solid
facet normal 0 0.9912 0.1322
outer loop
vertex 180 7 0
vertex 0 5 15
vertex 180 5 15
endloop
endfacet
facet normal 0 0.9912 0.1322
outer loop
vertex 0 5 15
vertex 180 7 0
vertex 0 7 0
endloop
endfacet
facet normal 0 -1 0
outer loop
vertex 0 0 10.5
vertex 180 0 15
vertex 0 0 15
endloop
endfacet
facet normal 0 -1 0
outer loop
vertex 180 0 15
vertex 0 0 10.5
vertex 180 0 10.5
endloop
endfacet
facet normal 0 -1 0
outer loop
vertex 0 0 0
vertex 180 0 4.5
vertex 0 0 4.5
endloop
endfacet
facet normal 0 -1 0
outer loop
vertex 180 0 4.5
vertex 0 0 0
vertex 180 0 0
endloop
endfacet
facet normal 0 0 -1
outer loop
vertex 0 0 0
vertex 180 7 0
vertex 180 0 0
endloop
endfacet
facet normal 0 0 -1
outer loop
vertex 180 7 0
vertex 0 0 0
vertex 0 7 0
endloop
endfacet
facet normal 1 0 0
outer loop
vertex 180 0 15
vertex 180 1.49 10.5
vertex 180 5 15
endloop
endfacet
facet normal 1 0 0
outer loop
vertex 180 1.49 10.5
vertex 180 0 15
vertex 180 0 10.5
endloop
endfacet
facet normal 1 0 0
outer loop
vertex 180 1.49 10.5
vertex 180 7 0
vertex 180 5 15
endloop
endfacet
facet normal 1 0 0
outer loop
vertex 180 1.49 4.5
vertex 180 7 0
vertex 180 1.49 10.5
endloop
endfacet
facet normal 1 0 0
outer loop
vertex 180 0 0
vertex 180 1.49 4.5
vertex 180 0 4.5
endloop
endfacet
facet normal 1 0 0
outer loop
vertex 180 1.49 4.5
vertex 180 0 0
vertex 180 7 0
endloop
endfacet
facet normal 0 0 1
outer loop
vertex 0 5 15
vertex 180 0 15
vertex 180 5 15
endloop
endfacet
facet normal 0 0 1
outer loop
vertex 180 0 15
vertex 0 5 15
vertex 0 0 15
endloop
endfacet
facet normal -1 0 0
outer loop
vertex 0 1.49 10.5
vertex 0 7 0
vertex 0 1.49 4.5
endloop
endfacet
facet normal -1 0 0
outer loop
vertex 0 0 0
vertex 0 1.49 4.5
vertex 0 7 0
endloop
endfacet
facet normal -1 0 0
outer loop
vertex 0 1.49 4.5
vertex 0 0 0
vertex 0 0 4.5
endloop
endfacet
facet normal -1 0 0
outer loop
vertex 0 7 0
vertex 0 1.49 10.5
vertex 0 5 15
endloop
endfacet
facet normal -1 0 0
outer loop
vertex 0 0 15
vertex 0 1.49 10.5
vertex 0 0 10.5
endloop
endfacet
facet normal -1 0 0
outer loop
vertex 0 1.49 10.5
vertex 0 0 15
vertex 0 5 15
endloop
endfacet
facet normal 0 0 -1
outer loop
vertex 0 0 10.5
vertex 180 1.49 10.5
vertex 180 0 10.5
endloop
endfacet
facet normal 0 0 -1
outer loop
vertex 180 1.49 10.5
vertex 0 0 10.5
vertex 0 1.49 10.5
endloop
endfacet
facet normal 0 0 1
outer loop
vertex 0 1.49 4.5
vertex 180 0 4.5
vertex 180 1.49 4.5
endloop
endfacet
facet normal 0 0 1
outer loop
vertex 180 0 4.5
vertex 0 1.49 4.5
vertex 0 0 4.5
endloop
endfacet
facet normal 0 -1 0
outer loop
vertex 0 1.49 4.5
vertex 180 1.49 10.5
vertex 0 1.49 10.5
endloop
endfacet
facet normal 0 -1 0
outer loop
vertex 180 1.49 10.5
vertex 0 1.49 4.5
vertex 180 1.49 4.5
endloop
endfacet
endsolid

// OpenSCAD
$fn=32;
//sppol sizes 52,37,32


leiste(5,7,15,180);

module leiste(td,bd,h,l){    
    fld=1.5;
    flh=6;
    difference(){
        rotate([90,0,90]) linear_extrude(height=l,convexity=10) polygon(points=[[0,0],[0,h],[td,h],[bd,0]],convexity=10);
        translate([-0.01,-0.01,h/2-flh/2])cube([l+0.02,fld,flh]);
    }
}

module pcbpost(x,y){
    color("green")
    difference(){
       //translate([x,y,0]) cylinder(r=postd/2,h=posth);
       mr=0.5;
      
        translate([x-postd/2,y-postd/2,both]) 
        minkowski(){
            cube([postd,postd,posth]);
            cylinder(r=mr,h=1);
        }
        
        
       translate([x,y,both]) cylinder(r=drill/2,h=posth+1.05);
    }
}

module casebot(w,h){
    union(){
        cube([w,h,both]);
        translate([-flapover,-flapover,-flapth+0.01])
           cube([w+flapover*2,h+flapover*2,flapth]);
    }
}
